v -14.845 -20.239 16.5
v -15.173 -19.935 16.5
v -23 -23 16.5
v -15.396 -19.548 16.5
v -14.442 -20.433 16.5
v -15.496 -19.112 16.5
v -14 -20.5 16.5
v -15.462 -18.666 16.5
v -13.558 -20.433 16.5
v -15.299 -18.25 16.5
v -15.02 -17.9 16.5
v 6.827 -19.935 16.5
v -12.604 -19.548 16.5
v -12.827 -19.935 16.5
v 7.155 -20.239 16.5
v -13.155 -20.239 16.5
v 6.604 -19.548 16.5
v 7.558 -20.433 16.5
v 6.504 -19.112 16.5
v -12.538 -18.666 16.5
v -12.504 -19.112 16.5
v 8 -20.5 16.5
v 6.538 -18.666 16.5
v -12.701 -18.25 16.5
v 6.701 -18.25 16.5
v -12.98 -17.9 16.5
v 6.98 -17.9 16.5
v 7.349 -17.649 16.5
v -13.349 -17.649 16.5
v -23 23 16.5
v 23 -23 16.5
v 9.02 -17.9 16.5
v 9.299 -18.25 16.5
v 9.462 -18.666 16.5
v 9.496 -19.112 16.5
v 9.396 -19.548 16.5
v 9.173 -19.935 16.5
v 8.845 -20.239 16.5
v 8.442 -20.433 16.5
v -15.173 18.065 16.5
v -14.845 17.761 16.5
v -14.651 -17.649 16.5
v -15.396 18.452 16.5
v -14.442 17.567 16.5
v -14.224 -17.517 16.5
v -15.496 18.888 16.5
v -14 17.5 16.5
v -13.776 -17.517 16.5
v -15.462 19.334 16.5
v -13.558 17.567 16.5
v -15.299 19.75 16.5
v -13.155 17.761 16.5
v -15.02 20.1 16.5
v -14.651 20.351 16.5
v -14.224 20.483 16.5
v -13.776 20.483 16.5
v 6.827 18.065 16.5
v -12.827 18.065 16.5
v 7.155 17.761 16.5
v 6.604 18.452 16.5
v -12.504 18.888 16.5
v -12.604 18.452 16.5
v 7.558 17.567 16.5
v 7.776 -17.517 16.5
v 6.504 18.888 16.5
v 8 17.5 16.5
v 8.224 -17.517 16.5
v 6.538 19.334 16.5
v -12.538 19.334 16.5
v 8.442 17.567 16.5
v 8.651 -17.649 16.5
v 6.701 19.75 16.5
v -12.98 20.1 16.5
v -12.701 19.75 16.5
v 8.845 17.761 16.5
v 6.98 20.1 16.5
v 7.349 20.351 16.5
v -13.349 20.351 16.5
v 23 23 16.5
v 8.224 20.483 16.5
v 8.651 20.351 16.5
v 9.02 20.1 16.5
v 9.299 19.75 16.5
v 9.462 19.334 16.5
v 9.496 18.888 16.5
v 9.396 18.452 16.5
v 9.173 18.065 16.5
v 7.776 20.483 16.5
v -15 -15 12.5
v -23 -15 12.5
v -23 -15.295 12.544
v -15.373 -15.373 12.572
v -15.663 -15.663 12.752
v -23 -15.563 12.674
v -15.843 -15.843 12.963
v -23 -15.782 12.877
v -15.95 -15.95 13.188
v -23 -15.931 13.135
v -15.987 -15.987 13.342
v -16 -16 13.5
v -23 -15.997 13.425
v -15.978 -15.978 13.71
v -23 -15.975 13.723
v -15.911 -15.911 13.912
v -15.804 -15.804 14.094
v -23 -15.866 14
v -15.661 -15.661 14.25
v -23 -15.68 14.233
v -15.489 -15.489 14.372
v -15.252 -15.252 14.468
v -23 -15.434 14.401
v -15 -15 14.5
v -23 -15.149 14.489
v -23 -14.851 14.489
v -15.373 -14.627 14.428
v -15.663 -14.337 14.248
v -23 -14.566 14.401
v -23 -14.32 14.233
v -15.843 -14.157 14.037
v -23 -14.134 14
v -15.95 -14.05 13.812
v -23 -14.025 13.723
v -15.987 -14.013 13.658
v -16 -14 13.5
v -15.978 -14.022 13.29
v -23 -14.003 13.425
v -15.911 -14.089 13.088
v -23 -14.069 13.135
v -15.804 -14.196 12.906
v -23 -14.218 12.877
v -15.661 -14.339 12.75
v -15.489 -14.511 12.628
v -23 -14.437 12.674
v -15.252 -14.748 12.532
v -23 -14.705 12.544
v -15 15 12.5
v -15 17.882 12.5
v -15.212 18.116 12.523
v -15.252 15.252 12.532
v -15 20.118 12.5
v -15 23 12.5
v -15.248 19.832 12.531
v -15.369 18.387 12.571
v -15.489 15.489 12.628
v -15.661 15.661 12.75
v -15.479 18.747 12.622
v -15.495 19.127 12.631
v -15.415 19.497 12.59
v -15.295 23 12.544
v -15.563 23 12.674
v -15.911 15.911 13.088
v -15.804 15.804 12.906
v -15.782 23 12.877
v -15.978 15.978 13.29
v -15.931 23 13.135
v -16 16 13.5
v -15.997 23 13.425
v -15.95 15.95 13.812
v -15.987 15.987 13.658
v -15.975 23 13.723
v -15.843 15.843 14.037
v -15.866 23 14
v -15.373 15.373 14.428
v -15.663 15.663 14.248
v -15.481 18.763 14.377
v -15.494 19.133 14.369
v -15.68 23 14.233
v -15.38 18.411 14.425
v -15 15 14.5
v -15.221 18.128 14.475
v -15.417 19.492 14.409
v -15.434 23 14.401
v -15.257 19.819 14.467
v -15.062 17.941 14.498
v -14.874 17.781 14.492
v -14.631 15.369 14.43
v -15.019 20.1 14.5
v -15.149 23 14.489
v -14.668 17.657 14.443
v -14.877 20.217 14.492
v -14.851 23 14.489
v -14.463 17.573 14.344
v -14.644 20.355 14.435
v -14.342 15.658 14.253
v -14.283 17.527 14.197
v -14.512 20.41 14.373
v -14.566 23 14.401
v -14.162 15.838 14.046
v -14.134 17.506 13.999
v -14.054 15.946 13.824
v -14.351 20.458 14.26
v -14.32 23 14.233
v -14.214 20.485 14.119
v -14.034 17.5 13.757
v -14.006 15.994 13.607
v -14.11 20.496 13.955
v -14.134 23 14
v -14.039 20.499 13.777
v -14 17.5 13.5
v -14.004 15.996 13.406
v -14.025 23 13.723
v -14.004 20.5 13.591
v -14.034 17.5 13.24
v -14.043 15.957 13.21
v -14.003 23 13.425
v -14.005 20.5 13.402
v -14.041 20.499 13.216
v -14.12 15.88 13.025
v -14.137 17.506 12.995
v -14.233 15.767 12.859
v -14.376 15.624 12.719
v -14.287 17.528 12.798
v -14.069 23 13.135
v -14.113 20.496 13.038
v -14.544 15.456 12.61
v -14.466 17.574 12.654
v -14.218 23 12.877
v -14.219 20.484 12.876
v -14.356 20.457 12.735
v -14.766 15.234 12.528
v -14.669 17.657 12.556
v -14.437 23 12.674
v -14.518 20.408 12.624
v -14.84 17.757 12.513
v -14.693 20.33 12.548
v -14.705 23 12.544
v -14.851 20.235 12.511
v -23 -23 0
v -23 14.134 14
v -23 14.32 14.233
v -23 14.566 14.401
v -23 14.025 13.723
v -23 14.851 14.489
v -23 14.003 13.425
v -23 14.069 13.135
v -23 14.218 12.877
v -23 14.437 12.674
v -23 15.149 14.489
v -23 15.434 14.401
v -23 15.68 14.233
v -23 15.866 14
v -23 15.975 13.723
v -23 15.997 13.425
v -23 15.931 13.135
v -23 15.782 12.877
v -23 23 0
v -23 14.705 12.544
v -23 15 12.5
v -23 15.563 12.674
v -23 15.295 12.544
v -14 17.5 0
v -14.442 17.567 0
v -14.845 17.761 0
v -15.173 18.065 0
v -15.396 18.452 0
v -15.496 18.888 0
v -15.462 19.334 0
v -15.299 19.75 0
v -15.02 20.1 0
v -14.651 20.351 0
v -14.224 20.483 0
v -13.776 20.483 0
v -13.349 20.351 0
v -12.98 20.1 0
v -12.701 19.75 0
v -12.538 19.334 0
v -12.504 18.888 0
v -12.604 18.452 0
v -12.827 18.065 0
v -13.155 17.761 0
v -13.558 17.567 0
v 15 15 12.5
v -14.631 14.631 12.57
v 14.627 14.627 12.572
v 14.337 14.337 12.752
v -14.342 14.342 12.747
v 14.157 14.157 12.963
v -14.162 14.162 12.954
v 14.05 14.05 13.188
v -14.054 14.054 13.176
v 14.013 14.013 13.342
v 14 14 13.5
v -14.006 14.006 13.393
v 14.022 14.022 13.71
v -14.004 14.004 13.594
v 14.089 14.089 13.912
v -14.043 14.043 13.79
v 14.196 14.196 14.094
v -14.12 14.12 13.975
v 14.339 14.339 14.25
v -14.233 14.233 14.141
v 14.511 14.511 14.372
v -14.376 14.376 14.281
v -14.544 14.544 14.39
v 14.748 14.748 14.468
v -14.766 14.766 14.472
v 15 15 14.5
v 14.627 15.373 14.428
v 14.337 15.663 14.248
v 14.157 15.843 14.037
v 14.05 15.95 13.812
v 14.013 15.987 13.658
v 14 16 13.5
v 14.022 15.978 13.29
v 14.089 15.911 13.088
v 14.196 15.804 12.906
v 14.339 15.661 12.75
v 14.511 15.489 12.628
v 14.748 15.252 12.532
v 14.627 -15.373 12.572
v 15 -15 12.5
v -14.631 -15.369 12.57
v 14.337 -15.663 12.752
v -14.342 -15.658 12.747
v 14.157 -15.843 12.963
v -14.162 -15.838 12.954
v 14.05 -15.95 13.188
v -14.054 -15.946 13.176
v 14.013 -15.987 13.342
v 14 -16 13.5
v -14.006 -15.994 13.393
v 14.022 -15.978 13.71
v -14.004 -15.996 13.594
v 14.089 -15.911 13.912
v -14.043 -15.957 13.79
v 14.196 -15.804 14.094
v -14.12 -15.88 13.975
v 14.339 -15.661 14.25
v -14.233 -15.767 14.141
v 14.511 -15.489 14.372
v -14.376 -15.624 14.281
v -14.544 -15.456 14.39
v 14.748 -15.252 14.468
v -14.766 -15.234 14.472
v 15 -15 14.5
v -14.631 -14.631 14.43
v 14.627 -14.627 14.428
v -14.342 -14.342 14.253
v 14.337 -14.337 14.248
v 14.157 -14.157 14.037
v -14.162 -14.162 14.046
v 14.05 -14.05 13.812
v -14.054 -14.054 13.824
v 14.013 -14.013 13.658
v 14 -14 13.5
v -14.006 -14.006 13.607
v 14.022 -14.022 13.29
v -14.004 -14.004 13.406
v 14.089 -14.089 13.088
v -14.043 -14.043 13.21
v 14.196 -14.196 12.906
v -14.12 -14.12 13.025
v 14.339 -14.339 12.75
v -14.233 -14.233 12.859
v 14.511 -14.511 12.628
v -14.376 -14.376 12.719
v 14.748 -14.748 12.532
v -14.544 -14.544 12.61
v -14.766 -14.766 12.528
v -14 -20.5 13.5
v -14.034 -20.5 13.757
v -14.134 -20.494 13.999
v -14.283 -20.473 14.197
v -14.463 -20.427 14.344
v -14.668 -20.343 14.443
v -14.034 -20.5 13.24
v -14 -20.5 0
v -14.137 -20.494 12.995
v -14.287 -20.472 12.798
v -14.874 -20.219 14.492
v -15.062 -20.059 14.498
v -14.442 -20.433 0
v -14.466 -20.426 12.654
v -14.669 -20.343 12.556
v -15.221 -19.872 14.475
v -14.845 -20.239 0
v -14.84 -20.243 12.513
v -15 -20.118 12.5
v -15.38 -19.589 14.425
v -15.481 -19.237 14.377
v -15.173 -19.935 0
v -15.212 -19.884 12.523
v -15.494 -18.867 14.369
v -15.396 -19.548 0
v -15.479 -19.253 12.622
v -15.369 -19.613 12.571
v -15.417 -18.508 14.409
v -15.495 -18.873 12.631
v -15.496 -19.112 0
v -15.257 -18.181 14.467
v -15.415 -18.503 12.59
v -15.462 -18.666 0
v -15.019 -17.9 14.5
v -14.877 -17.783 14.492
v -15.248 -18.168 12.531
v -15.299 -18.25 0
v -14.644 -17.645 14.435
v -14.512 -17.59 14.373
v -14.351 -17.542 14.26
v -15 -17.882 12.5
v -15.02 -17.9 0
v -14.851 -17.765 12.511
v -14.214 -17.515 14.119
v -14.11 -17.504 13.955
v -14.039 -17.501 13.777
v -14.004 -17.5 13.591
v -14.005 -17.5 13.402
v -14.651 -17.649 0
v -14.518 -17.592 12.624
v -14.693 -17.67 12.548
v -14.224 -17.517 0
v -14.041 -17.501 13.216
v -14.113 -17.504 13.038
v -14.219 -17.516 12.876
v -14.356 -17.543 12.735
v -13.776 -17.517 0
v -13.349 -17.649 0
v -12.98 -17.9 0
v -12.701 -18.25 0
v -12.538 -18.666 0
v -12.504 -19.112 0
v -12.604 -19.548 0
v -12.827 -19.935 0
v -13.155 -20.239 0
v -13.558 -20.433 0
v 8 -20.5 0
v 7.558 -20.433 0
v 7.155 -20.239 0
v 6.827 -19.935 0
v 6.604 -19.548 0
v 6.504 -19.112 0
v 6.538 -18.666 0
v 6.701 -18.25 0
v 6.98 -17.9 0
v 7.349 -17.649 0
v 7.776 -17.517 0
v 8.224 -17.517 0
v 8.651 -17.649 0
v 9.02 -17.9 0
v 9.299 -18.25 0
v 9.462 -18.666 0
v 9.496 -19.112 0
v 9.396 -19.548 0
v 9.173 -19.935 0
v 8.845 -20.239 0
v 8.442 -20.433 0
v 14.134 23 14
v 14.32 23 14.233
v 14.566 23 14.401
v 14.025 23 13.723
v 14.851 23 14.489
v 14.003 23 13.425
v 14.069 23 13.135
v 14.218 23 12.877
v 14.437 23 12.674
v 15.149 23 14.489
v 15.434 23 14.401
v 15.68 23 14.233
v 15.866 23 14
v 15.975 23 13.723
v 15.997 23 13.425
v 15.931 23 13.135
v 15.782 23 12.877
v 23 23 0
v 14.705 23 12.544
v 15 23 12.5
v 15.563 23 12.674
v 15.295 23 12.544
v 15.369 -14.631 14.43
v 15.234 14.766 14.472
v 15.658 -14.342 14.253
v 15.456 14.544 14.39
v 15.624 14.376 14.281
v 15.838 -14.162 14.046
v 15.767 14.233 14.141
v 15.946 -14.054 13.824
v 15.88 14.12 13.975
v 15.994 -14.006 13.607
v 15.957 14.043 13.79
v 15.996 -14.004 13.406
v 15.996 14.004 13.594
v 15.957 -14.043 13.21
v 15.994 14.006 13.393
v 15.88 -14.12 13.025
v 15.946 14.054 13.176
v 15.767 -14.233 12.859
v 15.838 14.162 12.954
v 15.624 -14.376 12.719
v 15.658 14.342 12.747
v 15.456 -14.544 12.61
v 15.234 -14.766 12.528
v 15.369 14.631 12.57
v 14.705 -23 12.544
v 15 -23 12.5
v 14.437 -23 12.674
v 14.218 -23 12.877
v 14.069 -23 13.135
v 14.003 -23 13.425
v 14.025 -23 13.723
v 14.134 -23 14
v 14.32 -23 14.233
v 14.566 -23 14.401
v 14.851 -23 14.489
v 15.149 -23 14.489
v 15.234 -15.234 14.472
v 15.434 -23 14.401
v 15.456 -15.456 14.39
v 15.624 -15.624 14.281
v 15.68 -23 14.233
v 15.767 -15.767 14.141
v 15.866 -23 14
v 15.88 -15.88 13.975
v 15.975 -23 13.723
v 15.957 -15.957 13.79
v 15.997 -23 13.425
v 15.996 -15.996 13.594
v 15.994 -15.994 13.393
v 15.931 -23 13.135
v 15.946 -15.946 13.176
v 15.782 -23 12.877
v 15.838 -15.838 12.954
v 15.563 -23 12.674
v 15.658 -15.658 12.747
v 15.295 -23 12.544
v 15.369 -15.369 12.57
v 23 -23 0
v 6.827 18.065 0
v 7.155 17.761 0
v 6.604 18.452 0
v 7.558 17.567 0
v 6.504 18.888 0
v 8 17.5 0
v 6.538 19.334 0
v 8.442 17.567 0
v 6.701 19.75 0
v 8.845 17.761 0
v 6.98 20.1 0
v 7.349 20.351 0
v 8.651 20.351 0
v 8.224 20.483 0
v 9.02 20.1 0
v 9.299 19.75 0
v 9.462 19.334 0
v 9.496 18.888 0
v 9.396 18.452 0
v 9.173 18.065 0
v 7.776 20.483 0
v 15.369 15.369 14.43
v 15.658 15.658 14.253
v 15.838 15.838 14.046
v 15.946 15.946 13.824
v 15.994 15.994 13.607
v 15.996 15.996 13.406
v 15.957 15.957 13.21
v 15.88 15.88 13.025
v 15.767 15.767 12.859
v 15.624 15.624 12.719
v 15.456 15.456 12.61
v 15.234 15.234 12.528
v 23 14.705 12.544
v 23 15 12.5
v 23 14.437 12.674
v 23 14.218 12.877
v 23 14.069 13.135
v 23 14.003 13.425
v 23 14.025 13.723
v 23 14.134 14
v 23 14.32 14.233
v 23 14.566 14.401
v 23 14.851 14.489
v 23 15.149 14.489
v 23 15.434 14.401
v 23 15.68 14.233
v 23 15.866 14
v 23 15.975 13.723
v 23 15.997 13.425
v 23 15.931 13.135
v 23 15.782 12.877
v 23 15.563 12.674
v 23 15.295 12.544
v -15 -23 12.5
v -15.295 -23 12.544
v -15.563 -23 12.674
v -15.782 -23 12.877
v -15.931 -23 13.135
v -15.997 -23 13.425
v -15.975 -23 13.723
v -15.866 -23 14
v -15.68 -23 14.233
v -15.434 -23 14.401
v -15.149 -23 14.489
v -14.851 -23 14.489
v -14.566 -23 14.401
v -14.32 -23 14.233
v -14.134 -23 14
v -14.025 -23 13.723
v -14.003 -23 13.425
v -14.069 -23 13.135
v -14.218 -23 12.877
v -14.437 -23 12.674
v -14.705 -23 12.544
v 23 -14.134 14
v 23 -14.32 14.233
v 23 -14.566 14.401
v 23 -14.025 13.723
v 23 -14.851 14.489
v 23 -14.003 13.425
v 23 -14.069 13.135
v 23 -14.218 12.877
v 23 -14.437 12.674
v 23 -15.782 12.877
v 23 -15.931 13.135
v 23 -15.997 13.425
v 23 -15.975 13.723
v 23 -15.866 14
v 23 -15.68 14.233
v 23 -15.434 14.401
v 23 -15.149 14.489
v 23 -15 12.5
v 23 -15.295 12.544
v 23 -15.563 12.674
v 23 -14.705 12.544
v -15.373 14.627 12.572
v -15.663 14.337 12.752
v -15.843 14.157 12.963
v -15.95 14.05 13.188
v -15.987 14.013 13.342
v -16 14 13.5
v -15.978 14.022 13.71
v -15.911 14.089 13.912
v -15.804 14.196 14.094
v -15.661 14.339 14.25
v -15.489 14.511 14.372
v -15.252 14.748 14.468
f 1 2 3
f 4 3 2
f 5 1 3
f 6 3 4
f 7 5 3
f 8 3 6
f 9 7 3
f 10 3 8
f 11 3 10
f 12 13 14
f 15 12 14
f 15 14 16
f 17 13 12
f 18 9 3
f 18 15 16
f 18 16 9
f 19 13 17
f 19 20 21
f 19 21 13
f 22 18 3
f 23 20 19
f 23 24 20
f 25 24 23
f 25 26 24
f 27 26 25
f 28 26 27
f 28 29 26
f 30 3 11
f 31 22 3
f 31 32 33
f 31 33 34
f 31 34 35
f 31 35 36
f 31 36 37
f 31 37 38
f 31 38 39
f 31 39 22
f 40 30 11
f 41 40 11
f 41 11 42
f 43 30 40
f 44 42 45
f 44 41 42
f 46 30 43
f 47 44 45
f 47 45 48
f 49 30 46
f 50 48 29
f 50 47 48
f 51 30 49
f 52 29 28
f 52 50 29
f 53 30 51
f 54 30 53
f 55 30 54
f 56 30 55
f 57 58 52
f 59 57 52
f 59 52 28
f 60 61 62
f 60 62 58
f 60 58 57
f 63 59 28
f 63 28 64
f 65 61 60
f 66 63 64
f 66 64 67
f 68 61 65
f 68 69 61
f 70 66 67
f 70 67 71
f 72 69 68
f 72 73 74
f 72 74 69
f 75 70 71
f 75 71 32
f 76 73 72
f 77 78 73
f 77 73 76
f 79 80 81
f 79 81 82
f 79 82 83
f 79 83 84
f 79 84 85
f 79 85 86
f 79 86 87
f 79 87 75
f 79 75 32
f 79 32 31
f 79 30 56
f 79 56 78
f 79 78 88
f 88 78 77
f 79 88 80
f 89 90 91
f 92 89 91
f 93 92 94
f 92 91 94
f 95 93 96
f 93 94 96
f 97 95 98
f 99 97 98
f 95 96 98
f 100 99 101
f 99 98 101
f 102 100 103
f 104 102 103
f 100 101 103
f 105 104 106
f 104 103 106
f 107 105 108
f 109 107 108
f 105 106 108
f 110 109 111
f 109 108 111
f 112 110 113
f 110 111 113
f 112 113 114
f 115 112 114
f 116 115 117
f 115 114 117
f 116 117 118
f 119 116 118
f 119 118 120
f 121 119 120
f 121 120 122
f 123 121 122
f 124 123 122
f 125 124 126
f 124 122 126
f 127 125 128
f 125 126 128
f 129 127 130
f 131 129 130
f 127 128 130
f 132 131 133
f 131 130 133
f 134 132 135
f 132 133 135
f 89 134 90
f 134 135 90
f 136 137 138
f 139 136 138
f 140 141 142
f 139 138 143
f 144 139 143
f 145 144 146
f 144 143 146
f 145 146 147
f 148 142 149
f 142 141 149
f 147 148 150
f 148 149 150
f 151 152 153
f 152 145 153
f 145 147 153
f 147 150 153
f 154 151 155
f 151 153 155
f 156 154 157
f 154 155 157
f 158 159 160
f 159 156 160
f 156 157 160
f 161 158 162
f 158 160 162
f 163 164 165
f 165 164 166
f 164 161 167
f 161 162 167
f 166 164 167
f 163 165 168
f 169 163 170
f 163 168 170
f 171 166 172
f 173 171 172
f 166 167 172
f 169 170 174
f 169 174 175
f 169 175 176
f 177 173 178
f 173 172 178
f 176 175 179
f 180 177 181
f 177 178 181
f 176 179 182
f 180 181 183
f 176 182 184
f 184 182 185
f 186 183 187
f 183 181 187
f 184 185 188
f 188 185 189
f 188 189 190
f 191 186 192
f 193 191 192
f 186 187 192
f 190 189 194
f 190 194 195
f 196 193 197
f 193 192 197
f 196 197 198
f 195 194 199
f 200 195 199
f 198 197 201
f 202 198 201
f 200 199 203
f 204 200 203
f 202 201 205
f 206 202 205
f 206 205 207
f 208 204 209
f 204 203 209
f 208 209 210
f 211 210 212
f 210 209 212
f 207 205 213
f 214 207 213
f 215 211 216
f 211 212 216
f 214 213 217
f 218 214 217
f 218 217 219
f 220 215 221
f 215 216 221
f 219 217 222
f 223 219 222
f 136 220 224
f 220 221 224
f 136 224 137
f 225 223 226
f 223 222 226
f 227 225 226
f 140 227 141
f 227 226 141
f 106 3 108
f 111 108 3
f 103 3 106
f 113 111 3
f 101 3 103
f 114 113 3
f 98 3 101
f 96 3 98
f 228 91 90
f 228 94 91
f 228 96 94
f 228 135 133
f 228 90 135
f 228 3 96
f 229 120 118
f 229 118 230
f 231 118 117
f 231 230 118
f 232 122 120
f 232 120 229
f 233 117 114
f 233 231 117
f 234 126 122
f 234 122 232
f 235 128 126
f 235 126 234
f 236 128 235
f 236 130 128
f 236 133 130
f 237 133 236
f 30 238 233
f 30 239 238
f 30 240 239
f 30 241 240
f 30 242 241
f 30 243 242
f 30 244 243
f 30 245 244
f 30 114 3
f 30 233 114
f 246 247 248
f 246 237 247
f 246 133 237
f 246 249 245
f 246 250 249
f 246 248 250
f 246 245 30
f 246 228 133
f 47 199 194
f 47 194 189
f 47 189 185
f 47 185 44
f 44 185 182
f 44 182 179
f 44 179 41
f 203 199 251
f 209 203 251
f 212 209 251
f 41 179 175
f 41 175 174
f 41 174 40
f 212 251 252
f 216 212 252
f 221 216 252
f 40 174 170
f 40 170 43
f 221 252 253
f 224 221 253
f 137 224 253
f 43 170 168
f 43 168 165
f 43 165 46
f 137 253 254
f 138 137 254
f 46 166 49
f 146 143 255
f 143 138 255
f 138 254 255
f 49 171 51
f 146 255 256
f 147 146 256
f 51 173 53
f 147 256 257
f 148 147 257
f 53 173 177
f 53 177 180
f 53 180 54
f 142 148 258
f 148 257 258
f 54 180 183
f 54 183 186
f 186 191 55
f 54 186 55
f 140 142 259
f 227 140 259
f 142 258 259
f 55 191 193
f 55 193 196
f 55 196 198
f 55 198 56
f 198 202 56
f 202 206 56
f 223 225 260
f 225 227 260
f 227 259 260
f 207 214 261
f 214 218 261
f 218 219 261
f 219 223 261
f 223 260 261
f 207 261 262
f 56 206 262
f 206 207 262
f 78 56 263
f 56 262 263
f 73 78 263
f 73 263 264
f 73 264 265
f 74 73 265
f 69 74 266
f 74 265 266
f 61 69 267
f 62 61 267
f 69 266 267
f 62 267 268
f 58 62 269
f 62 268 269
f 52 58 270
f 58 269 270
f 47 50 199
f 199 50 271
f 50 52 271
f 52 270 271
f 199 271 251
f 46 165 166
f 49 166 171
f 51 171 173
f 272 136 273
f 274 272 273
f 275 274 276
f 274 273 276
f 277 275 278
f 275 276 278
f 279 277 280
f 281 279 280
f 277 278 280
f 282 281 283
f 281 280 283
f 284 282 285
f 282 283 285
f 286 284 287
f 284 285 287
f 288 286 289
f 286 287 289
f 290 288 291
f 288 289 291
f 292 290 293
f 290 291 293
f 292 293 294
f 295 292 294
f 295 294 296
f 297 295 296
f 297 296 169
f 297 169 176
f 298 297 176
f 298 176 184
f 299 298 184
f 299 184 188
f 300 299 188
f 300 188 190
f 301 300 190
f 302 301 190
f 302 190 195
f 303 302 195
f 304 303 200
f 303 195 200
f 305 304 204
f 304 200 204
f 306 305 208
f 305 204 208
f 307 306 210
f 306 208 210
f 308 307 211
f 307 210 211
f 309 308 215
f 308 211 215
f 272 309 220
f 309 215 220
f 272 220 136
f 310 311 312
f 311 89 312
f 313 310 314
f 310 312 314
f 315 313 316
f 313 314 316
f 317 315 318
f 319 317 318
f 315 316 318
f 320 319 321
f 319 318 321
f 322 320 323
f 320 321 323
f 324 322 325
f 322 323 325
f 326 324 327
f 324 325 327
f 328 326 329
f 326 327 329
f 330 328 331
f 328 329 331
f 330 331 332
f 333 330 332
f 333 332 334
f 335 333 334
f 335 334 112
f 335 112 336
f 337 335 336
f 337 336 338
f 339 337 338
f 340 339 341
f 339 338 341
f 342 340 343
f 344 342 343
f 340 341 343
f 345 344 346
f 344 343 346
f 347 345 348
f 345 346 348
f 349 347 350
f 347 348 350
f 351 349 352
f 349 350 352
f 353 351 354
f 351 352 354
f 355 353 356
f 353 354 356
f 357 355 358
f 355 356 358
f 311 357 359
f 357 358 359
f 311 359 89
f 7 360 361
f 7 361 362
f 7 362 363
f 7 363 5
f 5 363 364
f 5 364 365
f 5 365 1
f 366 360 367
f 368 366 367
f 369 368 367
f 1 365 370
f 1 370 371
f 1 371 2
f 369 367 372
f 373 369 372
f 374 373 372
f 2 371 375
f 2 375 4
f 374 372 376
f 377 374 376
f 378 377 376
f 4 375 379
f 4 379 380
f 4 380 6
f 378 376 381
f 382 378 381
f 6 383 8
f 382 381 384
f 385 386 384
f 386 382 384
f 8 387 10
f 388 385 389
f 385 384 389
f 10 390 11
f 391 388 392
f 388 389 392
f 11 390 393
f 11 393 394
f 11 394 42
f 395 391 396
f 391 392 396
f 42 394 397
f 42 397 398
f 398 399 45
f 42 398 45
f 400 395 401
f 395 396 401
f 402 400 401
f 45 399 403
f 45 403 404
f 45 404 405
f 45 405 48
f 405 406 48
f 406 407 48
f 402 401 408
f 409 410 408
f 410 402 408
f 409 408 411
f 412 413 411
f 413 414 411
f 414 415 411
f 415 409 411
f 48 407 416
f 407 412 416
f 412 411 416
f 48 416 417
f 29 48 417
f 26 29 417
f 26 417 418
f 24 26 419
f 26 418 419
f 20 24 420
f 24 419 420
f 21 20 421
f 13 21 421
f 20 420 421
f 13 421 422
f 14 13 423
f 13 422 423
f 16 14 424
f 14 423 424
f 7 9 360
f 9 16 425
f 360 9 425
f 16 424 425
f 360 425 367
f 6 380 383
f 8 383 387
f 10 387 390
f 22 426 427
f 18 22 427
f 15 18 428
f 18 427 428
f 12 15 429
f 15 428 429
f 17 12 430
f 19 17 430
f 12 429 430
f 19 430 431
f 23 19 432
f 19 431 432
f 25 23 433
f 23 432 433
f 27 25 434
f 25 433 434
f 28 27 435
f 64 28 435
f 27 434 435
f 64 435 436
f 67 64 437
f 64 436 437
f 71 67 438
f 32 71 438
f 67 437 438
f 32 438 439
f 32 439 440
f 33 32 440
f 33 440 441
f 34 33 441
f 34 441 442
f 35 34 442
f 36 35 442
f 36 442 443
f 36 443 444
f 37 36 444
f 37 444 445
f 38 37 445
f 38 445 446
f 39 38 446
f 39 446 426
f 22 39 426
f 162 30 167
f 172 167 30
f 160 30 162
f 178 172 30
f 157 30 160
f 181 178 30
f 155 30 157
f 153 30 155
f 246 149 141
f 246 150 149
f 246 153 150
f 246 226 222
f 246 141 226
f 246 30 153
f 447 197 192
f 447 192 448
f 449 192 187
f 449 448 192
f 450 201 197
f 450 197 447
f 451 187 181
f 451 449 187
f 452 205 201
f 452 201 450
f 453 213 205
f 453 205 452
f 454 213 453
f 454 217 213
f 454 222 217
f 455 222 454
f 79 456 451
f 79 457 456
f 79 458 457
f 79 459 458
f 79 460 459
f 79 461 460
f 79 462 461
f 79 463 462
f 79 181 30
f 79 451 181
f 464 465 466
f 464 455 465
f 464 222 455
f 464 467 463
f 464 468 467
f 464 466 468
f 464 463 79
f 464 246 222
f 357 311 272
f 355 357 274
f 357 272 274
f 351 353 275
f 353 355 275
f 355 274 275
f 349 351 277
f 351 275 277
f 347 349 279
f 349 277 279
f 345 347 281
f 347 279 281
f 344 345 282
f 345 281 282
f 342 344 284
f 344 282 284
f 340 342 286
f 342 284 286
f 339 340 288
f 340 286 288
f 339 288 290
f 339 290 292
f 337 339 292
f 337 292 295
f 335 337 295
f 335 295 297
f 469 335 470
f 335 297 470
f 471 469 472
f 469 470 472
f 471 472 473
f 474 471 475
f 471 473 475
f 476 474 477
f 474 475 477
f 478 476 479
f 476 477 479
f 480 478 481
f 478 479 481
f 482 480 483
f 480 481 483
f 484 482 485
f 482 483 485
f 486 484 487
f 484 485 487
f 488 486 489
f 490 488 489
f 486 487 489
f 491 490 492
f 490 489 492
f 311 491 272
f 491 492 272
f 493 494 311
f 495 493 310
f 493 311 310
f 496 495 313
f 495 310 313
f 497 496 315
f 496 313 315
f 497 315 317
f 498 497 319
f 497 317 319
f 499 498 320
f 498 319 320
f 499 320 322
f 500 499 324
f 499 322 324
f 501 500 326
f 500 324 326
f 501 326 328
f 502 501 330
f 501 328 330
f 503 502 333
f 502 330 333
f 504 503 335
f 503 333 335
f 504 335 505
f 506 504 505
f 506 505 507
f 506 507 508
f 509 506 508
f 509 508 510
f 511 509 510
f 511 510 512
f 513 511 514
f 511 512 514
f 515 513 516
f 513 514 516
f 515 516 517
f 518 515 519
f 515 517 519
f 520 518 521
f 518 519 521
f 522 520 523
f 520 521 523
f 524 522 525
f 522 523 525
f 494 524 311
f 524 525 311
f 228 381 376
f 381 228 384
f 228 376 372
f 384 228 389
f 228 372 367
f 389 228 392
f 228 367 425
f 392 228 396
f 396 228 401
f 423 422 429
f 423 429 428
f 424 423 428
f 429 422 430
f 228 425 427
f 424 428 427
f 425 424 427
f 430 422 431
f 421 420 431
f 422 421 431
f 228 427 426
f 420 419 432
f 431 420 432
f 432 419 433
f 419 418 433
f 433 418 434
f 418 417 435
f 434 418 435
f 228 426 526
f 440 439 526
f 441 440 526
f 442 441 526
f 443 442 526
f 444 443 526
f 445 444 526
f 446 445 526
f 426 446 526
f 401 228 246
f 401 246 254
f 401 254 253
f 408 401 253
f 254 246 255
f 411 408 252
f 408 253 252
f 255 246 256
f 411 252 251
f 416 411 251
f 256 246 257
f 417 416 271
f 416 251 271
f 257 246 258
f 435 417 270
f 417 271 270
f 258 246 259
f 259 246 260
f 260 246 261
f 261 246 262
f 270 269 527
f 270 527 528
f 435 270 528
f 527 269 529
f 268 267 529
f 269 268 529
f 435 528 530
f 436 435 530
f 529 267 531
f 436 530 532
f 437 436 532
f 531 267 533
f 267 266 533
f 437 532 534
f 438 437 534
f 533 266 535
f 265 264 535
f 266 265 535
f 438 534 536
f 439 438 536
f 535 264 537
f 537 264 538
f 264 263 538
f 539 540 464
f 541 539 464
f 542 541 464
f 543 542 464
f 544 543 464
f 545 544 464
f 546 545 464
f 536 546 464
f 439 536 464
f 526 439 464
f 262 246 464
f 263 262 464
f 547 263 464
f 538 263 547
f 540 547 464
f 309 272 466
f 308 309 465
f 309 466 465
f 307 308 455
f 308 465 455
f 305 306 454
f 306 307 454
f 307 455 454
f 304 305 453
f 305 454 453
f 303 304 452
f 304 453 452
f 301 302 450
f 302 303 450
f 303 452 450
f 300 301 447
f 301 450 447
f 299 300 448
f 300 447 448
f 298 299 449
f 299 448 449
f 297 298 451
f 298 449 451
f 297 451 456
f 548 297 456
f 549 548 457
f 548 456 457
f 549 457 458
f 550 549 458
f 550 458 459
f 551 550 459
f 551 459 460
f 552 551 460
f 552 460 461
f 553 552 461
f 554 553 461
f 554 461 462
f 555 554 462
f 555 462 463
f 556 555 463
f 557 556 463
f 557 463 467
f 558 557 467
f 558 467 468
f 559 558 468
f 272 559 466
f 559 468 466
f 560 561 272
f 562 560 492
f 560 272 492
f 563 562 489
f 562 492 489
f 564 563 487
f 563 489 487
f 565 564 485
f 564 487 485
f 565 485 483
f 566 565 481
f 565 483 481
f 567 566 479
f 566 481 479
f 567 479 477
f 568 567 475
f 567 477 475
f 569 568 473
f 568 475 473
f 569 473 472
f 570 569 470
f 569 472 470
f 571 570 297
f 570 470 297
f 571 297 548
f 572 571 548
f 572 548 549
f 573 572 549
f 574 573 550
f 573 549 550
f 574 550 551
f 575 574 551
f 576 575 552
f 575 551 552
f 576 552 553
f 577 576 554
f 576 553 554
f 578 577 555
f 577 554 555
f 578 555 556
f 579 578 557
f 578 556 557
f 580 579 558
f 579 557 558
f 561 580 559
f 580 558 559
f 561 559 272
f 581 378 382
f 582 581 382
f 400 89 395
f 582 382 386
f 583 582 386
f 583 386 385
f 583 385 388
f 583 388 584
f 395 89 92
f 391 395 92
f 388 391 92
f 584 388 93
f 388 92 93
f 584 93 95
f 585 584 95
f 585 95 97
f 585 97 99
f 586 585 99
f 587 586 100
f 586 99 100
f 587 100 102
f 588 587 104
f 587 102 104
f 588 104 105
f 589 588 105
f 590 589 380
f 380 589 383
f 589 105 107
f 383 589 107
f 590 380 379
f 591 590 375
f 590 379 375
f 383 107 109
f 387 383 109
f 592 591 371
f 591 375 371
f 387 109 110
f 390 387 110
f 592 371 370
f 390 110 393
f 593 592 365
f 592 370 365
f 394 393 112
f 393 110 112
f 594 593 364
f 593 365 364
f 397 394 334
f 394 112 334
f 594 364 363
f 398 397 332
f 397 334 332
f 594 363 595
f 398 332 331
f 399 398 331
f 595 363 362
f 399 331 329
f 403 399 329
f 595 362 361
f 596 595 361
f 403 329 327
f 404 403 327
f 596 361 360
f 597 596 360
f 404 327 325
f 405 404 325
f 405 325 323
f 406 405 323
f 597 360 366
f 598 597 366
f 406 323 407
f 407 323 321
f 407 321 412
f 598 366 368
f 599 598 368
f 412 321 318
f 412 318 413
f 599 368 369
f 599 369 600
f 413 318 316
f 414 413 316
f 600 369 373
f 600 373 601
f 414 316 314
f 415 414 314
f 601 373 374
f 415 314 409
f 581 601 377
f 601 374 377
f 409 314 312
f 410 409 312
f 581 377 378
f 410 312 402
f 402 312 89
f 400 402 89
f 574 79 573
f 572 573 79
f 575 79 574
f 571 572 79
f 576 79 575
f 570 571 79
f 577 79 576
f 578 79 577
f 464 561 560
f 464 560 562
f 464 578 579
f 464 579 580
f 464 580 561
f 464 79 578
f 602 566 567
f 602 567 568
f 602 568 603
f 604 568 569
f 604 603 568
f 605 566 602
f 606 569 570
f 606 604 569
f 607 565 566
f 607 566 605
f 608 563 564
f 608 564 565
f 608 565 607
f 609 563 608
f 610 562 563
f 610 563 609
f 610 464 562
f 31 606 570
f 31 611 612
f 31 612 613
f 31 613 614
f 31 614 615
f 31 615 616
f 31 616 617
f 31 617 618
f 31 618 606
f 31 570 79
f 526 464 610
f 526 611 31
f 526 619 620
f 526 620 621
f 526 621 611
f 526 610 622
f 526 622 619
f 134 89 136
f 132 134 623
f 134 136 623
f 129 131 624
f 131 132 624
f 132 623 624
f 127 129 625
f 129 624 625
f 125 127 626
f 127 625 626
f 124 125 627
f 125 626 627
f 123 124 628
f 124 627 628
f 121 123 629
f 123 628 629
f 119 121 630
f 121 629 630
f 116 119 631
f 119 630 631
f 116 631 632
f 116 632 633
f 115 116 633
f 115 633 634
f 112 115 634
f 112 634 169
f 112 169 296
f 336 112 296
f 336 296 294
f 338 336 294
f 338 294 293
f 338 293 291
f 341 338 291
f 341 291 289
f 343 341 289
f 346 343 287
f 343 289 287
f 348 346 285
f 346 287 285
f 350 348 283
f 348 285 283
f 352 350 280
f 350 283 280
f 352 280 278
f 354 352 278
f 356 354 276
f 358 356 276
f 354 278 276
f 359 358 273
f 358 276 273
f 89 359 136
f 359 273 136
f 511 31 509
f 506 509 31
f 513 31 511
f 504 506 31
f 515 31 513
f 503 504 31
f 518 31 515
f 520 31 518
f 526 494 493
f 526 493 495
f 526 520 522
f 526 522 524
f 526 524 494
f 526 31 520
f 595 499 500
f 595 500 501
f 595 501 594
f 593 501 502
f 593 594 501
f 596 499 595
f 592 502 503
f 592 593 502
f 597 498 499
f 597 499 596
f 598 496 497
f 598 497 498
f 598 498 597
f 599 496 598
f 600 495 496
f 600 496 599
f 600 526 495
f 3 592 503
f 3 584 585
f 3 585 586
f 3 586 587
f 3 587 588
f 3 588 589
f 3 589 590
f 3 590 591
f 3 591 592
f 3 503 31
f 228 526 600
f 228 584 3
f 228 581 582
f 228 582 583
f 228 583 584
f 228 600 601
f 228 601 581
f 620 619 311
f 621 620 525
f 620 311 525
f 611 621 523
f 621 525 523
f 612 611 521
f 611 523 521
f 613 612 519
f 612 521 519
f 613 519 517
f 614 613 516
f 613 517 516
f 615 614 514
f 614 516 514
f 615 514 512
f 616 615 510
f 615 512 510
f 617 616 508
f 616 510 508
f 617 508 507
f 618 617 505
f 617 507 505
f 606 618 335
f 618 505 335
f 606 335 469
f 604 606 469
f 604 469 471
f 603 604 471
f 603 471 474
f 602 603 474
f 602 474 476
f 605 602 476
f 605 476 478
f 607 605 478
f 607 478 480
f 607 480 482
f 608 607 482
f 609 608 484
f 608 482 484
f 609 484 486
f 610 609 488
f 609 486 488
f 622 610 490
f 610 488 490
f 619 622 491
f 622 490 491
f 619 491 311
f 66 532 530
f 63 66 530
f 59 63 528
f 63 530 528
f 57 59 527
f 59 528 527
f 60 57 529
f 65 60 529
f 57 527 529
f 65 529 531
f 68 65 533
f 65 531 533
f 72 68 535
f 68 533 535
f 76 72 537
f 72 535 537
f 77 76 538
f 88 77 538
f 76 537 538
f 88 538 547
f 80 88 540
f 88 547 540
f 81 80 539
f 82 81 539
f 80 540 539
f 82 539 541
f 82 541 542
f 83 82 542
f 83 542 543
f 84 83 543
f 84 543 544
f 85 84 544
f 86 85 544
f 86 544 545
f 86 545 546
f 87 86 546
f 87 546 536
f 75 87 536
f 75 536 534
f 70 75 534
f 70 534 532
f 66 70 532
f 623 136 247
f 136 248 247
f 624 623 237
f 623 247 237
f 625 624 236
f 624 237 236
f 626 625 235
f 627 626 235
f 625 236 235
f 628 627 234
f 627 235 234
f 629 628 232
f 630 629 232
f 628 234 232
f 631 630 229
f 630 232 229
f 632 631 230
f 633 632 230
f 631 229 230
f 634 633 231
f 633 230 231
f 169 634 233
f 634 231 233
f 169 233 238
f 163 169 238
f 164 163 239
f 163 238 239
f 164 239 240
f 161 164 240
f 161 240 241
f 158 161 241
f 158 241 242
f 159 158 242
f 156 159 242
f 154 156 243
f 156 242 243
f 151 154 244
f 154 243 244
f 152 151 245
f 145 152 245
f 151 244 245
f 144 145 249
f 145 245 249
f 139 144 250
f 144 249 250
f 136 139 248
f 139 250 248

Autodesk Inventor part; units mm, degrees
ref_plane "YZ Plane" through (0, 0, 0) normal (1, 0, 0) x (0, 1, 0)
ref_plane "XZ Plane" through (0, 0, 0) normal (0, 1, 0) x (-1, 0, 0)
ref_plane "XY Plane" through (0, 0, 0) normal (0, 0, 1) x (1, 0, 0)
sketch "スケッチ1" plane through (0, 0, 0) normal (0, 0, 1) x (1, 0, 0)
  line L0 (-23, 23) -> (23, 23)
  line L1 (23, 23) -> (23, -23)
  line L2 (23, -23) -> (-23, -23)
  line L3 (-23, -23) -> (-23, 23)
  point P0 (0, 0)
  dimension "d0" = 46
  dimension "d1" = 46
  dimension "d2" = 23
  dimension "d3" = 23
extrude "押し出し1" add sketch "スケッチ1" along normal blind 16.5
sketch "スケッチ2" plane through (23, -23, 0) normal (1, 0, 0) x (0, 0, -1)
  line L0 (0, 0) -> (-16.5, 0)
  line L1 (0, 46) -> (-16.5, 46)
  circle A0 centre (-13.5, 38) radius 1
  circle A1 centre (-13.5, 8) radius 1
  line L2 (-16.5, 46) -> (-16.5, 0)
  point P0 (0, 23)
  dimension "d6" = 2
  dimension "d8" = 8
  dimension "d13" = 8
  dimension "d48" = 3
  dimension "d50" = 3
hole "穴1" at (23, -15, 13.5) at (23, 15, 13.5) direction (-1, 0, 0) diameter 2 end through all
sketch "スケッチ3" plane through (-23, -23, 0) normal (0, -1, 0) x (1, 0, 0)
  line L0 (46, 16.5) -> (0, 16.5)
  line L1 (0, 0) -> (0, 16.5)
  line L2 (46, 0) -> (46, 16.5)
  circle A0 centre (8, 13.5) radius 1
  circle A1 centre (38, 13.5) radius 1
  point P0 (23, 0)
  dimension "d22" = 2
  dimension "d23" = 3
  dimension "d25" = 3
  dimension "d26" = 8
  dimension "d27" = 8
hole "穴2" at (-15, -23, 13.5) at (15, -23, 13.5) direction (0, 1, 0) diameter 2 end through all
thread "ねじ1"
thread "ねじ3"
thread "ねじ5"
thread "ねじ6"
sketch "スケッチ4" plane through (0, 0, 16.5) normal (0, 0, 1) x (1, 0, 0)
  line L0 (-23, -23) -> (-23, 23)
  line L1 (23, -23) -> (-23, -23)
  circle A0 centre (-14, 19) radius 1.5
  circle A1 centre (8, 19) radius 1.5
  circle A2 centre (-14, -19) radius 1.5
  circle A3 centre (8, -19) radius 1.5
  dimension "d51" = 3
  dimension "d52" = 22
  dimension "d53" = 22
  dimension "d54" = 38
  dimension "d55" = 38
  dimension "d88" = 9
  dimension "d89" = 9
  dimension "d90" = 4
  dimension "d91" = 4
hole "穴3" at (-14, -19, 16.5) at (-14, 19, 16.5) at (8, -19, 16.5) at (8, 19, 16.5) direction (0, 0, -1) diameter 3 end through all
thread "ねじ7"
thread "ねじ8"
thread "ねじ9"
thread "ねじ10"
thread "ねじ11"
thread "ねじ13"
thread "ねじ14"
thread "ねじ16"
properties part number "14" material "アセタール樹脂、白"
